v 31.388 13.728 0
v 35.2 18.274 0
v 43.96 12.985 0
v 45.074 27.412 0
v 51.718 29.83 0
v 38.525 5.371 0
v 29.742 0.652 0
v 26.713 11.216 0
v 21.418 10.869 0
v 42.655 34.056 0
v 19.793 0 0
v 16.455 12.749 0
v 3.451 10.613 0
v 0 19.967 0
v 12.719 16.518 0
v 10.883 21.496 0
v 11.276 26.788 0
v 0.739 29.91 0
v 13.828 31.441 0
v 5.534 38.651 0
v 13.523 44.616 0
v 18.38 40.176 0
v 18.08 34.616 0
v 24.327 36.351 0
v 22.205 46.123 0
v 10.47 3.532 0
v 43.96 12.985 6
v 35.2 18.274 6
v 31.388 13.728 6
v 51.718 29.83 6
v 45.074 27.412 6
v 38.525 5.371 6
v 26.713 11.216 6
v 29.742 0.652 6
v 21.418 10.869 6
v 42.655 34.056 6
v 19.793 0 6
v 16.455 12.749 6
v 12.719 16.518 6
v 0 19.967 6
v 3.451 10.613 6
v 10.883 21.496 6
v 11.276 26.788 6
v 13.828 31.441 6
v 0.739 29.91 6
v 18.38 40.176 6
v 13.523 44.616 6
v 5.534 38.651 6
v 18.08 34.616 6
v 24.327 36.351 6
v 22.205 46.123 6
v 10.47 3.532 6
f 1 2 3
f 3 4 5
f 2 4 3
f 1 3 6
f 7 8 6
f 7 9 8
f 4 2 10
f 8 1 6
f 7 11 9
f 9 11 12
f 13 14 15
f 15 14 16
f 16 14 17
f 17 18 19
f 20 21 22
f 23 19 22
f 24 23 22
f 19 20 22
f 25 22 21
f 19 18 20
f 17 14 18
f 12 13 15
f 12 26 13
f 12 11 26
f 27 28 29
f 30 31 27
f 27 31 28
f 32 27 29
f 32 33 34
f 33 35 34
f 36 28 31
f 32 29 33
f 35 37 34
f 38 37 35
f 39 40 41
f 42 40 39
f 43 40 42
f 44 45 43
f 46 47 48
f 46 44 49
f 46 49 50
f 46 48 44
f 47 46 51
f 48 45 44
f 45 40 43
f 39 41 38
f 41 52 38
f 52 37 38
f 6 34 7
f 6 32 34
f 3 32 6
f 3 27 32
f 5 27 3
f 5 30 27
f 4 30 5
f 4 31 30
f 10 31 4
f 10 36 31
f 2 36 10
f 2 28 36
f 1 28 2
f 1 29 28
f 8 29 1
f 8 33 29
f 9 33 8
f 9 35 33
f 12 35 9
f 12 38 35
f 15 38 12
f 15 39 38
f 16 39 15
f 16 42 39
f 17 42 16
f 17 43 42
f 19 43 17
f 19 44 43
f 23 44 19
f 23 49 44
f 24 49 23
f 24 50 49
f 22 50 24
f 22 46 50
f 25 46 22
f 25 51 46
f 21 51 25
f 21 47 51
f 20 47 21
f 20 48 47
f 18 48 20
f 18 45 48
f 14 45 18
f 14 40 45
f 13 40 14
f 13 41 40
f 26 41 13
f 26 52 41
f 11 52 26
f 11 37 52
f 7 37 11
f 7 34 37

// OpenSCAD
$fn = 32;

// ----------------------------------------------------------------------
// Hook plate: curl radius 18 mm over 245 degrees, 10 mm thick band
// ----------------------------------------------------------------------

// --- parameters (mm) ---
profile_height = 6;       // extrusion height
profile_points = 26;      // points of the closed outline

profile = [[18.38, 40.176], [22.205, 46.123], [13.523, 44.616], [5.534, 38.651], [0.739, 29.91], [0, 19.967], [3.451, 10.613], [10.47, 3.532], [19.793, 0], [29.742, 0.652], [38.525, 5.371], [43.96, 12.985], [51.718, 29.83], [45.074, 27.412], [42.655, 34.056], [35.2, 18.274], [31.388, 13.728], [26.713, 11.216], [21.418, 10.869], [16.455, 12.749], [12.719, 16.518], [10.883, 21.496], [11.276, 26.788], [13.828, 31.441], [18.08, 34.616], [24.327, 36.351]];  // single closed polygon, 26 points, counter clockwise

// --- the one profile operation ---
linear_extrude(height = profile_height) polygon(points = profile);
